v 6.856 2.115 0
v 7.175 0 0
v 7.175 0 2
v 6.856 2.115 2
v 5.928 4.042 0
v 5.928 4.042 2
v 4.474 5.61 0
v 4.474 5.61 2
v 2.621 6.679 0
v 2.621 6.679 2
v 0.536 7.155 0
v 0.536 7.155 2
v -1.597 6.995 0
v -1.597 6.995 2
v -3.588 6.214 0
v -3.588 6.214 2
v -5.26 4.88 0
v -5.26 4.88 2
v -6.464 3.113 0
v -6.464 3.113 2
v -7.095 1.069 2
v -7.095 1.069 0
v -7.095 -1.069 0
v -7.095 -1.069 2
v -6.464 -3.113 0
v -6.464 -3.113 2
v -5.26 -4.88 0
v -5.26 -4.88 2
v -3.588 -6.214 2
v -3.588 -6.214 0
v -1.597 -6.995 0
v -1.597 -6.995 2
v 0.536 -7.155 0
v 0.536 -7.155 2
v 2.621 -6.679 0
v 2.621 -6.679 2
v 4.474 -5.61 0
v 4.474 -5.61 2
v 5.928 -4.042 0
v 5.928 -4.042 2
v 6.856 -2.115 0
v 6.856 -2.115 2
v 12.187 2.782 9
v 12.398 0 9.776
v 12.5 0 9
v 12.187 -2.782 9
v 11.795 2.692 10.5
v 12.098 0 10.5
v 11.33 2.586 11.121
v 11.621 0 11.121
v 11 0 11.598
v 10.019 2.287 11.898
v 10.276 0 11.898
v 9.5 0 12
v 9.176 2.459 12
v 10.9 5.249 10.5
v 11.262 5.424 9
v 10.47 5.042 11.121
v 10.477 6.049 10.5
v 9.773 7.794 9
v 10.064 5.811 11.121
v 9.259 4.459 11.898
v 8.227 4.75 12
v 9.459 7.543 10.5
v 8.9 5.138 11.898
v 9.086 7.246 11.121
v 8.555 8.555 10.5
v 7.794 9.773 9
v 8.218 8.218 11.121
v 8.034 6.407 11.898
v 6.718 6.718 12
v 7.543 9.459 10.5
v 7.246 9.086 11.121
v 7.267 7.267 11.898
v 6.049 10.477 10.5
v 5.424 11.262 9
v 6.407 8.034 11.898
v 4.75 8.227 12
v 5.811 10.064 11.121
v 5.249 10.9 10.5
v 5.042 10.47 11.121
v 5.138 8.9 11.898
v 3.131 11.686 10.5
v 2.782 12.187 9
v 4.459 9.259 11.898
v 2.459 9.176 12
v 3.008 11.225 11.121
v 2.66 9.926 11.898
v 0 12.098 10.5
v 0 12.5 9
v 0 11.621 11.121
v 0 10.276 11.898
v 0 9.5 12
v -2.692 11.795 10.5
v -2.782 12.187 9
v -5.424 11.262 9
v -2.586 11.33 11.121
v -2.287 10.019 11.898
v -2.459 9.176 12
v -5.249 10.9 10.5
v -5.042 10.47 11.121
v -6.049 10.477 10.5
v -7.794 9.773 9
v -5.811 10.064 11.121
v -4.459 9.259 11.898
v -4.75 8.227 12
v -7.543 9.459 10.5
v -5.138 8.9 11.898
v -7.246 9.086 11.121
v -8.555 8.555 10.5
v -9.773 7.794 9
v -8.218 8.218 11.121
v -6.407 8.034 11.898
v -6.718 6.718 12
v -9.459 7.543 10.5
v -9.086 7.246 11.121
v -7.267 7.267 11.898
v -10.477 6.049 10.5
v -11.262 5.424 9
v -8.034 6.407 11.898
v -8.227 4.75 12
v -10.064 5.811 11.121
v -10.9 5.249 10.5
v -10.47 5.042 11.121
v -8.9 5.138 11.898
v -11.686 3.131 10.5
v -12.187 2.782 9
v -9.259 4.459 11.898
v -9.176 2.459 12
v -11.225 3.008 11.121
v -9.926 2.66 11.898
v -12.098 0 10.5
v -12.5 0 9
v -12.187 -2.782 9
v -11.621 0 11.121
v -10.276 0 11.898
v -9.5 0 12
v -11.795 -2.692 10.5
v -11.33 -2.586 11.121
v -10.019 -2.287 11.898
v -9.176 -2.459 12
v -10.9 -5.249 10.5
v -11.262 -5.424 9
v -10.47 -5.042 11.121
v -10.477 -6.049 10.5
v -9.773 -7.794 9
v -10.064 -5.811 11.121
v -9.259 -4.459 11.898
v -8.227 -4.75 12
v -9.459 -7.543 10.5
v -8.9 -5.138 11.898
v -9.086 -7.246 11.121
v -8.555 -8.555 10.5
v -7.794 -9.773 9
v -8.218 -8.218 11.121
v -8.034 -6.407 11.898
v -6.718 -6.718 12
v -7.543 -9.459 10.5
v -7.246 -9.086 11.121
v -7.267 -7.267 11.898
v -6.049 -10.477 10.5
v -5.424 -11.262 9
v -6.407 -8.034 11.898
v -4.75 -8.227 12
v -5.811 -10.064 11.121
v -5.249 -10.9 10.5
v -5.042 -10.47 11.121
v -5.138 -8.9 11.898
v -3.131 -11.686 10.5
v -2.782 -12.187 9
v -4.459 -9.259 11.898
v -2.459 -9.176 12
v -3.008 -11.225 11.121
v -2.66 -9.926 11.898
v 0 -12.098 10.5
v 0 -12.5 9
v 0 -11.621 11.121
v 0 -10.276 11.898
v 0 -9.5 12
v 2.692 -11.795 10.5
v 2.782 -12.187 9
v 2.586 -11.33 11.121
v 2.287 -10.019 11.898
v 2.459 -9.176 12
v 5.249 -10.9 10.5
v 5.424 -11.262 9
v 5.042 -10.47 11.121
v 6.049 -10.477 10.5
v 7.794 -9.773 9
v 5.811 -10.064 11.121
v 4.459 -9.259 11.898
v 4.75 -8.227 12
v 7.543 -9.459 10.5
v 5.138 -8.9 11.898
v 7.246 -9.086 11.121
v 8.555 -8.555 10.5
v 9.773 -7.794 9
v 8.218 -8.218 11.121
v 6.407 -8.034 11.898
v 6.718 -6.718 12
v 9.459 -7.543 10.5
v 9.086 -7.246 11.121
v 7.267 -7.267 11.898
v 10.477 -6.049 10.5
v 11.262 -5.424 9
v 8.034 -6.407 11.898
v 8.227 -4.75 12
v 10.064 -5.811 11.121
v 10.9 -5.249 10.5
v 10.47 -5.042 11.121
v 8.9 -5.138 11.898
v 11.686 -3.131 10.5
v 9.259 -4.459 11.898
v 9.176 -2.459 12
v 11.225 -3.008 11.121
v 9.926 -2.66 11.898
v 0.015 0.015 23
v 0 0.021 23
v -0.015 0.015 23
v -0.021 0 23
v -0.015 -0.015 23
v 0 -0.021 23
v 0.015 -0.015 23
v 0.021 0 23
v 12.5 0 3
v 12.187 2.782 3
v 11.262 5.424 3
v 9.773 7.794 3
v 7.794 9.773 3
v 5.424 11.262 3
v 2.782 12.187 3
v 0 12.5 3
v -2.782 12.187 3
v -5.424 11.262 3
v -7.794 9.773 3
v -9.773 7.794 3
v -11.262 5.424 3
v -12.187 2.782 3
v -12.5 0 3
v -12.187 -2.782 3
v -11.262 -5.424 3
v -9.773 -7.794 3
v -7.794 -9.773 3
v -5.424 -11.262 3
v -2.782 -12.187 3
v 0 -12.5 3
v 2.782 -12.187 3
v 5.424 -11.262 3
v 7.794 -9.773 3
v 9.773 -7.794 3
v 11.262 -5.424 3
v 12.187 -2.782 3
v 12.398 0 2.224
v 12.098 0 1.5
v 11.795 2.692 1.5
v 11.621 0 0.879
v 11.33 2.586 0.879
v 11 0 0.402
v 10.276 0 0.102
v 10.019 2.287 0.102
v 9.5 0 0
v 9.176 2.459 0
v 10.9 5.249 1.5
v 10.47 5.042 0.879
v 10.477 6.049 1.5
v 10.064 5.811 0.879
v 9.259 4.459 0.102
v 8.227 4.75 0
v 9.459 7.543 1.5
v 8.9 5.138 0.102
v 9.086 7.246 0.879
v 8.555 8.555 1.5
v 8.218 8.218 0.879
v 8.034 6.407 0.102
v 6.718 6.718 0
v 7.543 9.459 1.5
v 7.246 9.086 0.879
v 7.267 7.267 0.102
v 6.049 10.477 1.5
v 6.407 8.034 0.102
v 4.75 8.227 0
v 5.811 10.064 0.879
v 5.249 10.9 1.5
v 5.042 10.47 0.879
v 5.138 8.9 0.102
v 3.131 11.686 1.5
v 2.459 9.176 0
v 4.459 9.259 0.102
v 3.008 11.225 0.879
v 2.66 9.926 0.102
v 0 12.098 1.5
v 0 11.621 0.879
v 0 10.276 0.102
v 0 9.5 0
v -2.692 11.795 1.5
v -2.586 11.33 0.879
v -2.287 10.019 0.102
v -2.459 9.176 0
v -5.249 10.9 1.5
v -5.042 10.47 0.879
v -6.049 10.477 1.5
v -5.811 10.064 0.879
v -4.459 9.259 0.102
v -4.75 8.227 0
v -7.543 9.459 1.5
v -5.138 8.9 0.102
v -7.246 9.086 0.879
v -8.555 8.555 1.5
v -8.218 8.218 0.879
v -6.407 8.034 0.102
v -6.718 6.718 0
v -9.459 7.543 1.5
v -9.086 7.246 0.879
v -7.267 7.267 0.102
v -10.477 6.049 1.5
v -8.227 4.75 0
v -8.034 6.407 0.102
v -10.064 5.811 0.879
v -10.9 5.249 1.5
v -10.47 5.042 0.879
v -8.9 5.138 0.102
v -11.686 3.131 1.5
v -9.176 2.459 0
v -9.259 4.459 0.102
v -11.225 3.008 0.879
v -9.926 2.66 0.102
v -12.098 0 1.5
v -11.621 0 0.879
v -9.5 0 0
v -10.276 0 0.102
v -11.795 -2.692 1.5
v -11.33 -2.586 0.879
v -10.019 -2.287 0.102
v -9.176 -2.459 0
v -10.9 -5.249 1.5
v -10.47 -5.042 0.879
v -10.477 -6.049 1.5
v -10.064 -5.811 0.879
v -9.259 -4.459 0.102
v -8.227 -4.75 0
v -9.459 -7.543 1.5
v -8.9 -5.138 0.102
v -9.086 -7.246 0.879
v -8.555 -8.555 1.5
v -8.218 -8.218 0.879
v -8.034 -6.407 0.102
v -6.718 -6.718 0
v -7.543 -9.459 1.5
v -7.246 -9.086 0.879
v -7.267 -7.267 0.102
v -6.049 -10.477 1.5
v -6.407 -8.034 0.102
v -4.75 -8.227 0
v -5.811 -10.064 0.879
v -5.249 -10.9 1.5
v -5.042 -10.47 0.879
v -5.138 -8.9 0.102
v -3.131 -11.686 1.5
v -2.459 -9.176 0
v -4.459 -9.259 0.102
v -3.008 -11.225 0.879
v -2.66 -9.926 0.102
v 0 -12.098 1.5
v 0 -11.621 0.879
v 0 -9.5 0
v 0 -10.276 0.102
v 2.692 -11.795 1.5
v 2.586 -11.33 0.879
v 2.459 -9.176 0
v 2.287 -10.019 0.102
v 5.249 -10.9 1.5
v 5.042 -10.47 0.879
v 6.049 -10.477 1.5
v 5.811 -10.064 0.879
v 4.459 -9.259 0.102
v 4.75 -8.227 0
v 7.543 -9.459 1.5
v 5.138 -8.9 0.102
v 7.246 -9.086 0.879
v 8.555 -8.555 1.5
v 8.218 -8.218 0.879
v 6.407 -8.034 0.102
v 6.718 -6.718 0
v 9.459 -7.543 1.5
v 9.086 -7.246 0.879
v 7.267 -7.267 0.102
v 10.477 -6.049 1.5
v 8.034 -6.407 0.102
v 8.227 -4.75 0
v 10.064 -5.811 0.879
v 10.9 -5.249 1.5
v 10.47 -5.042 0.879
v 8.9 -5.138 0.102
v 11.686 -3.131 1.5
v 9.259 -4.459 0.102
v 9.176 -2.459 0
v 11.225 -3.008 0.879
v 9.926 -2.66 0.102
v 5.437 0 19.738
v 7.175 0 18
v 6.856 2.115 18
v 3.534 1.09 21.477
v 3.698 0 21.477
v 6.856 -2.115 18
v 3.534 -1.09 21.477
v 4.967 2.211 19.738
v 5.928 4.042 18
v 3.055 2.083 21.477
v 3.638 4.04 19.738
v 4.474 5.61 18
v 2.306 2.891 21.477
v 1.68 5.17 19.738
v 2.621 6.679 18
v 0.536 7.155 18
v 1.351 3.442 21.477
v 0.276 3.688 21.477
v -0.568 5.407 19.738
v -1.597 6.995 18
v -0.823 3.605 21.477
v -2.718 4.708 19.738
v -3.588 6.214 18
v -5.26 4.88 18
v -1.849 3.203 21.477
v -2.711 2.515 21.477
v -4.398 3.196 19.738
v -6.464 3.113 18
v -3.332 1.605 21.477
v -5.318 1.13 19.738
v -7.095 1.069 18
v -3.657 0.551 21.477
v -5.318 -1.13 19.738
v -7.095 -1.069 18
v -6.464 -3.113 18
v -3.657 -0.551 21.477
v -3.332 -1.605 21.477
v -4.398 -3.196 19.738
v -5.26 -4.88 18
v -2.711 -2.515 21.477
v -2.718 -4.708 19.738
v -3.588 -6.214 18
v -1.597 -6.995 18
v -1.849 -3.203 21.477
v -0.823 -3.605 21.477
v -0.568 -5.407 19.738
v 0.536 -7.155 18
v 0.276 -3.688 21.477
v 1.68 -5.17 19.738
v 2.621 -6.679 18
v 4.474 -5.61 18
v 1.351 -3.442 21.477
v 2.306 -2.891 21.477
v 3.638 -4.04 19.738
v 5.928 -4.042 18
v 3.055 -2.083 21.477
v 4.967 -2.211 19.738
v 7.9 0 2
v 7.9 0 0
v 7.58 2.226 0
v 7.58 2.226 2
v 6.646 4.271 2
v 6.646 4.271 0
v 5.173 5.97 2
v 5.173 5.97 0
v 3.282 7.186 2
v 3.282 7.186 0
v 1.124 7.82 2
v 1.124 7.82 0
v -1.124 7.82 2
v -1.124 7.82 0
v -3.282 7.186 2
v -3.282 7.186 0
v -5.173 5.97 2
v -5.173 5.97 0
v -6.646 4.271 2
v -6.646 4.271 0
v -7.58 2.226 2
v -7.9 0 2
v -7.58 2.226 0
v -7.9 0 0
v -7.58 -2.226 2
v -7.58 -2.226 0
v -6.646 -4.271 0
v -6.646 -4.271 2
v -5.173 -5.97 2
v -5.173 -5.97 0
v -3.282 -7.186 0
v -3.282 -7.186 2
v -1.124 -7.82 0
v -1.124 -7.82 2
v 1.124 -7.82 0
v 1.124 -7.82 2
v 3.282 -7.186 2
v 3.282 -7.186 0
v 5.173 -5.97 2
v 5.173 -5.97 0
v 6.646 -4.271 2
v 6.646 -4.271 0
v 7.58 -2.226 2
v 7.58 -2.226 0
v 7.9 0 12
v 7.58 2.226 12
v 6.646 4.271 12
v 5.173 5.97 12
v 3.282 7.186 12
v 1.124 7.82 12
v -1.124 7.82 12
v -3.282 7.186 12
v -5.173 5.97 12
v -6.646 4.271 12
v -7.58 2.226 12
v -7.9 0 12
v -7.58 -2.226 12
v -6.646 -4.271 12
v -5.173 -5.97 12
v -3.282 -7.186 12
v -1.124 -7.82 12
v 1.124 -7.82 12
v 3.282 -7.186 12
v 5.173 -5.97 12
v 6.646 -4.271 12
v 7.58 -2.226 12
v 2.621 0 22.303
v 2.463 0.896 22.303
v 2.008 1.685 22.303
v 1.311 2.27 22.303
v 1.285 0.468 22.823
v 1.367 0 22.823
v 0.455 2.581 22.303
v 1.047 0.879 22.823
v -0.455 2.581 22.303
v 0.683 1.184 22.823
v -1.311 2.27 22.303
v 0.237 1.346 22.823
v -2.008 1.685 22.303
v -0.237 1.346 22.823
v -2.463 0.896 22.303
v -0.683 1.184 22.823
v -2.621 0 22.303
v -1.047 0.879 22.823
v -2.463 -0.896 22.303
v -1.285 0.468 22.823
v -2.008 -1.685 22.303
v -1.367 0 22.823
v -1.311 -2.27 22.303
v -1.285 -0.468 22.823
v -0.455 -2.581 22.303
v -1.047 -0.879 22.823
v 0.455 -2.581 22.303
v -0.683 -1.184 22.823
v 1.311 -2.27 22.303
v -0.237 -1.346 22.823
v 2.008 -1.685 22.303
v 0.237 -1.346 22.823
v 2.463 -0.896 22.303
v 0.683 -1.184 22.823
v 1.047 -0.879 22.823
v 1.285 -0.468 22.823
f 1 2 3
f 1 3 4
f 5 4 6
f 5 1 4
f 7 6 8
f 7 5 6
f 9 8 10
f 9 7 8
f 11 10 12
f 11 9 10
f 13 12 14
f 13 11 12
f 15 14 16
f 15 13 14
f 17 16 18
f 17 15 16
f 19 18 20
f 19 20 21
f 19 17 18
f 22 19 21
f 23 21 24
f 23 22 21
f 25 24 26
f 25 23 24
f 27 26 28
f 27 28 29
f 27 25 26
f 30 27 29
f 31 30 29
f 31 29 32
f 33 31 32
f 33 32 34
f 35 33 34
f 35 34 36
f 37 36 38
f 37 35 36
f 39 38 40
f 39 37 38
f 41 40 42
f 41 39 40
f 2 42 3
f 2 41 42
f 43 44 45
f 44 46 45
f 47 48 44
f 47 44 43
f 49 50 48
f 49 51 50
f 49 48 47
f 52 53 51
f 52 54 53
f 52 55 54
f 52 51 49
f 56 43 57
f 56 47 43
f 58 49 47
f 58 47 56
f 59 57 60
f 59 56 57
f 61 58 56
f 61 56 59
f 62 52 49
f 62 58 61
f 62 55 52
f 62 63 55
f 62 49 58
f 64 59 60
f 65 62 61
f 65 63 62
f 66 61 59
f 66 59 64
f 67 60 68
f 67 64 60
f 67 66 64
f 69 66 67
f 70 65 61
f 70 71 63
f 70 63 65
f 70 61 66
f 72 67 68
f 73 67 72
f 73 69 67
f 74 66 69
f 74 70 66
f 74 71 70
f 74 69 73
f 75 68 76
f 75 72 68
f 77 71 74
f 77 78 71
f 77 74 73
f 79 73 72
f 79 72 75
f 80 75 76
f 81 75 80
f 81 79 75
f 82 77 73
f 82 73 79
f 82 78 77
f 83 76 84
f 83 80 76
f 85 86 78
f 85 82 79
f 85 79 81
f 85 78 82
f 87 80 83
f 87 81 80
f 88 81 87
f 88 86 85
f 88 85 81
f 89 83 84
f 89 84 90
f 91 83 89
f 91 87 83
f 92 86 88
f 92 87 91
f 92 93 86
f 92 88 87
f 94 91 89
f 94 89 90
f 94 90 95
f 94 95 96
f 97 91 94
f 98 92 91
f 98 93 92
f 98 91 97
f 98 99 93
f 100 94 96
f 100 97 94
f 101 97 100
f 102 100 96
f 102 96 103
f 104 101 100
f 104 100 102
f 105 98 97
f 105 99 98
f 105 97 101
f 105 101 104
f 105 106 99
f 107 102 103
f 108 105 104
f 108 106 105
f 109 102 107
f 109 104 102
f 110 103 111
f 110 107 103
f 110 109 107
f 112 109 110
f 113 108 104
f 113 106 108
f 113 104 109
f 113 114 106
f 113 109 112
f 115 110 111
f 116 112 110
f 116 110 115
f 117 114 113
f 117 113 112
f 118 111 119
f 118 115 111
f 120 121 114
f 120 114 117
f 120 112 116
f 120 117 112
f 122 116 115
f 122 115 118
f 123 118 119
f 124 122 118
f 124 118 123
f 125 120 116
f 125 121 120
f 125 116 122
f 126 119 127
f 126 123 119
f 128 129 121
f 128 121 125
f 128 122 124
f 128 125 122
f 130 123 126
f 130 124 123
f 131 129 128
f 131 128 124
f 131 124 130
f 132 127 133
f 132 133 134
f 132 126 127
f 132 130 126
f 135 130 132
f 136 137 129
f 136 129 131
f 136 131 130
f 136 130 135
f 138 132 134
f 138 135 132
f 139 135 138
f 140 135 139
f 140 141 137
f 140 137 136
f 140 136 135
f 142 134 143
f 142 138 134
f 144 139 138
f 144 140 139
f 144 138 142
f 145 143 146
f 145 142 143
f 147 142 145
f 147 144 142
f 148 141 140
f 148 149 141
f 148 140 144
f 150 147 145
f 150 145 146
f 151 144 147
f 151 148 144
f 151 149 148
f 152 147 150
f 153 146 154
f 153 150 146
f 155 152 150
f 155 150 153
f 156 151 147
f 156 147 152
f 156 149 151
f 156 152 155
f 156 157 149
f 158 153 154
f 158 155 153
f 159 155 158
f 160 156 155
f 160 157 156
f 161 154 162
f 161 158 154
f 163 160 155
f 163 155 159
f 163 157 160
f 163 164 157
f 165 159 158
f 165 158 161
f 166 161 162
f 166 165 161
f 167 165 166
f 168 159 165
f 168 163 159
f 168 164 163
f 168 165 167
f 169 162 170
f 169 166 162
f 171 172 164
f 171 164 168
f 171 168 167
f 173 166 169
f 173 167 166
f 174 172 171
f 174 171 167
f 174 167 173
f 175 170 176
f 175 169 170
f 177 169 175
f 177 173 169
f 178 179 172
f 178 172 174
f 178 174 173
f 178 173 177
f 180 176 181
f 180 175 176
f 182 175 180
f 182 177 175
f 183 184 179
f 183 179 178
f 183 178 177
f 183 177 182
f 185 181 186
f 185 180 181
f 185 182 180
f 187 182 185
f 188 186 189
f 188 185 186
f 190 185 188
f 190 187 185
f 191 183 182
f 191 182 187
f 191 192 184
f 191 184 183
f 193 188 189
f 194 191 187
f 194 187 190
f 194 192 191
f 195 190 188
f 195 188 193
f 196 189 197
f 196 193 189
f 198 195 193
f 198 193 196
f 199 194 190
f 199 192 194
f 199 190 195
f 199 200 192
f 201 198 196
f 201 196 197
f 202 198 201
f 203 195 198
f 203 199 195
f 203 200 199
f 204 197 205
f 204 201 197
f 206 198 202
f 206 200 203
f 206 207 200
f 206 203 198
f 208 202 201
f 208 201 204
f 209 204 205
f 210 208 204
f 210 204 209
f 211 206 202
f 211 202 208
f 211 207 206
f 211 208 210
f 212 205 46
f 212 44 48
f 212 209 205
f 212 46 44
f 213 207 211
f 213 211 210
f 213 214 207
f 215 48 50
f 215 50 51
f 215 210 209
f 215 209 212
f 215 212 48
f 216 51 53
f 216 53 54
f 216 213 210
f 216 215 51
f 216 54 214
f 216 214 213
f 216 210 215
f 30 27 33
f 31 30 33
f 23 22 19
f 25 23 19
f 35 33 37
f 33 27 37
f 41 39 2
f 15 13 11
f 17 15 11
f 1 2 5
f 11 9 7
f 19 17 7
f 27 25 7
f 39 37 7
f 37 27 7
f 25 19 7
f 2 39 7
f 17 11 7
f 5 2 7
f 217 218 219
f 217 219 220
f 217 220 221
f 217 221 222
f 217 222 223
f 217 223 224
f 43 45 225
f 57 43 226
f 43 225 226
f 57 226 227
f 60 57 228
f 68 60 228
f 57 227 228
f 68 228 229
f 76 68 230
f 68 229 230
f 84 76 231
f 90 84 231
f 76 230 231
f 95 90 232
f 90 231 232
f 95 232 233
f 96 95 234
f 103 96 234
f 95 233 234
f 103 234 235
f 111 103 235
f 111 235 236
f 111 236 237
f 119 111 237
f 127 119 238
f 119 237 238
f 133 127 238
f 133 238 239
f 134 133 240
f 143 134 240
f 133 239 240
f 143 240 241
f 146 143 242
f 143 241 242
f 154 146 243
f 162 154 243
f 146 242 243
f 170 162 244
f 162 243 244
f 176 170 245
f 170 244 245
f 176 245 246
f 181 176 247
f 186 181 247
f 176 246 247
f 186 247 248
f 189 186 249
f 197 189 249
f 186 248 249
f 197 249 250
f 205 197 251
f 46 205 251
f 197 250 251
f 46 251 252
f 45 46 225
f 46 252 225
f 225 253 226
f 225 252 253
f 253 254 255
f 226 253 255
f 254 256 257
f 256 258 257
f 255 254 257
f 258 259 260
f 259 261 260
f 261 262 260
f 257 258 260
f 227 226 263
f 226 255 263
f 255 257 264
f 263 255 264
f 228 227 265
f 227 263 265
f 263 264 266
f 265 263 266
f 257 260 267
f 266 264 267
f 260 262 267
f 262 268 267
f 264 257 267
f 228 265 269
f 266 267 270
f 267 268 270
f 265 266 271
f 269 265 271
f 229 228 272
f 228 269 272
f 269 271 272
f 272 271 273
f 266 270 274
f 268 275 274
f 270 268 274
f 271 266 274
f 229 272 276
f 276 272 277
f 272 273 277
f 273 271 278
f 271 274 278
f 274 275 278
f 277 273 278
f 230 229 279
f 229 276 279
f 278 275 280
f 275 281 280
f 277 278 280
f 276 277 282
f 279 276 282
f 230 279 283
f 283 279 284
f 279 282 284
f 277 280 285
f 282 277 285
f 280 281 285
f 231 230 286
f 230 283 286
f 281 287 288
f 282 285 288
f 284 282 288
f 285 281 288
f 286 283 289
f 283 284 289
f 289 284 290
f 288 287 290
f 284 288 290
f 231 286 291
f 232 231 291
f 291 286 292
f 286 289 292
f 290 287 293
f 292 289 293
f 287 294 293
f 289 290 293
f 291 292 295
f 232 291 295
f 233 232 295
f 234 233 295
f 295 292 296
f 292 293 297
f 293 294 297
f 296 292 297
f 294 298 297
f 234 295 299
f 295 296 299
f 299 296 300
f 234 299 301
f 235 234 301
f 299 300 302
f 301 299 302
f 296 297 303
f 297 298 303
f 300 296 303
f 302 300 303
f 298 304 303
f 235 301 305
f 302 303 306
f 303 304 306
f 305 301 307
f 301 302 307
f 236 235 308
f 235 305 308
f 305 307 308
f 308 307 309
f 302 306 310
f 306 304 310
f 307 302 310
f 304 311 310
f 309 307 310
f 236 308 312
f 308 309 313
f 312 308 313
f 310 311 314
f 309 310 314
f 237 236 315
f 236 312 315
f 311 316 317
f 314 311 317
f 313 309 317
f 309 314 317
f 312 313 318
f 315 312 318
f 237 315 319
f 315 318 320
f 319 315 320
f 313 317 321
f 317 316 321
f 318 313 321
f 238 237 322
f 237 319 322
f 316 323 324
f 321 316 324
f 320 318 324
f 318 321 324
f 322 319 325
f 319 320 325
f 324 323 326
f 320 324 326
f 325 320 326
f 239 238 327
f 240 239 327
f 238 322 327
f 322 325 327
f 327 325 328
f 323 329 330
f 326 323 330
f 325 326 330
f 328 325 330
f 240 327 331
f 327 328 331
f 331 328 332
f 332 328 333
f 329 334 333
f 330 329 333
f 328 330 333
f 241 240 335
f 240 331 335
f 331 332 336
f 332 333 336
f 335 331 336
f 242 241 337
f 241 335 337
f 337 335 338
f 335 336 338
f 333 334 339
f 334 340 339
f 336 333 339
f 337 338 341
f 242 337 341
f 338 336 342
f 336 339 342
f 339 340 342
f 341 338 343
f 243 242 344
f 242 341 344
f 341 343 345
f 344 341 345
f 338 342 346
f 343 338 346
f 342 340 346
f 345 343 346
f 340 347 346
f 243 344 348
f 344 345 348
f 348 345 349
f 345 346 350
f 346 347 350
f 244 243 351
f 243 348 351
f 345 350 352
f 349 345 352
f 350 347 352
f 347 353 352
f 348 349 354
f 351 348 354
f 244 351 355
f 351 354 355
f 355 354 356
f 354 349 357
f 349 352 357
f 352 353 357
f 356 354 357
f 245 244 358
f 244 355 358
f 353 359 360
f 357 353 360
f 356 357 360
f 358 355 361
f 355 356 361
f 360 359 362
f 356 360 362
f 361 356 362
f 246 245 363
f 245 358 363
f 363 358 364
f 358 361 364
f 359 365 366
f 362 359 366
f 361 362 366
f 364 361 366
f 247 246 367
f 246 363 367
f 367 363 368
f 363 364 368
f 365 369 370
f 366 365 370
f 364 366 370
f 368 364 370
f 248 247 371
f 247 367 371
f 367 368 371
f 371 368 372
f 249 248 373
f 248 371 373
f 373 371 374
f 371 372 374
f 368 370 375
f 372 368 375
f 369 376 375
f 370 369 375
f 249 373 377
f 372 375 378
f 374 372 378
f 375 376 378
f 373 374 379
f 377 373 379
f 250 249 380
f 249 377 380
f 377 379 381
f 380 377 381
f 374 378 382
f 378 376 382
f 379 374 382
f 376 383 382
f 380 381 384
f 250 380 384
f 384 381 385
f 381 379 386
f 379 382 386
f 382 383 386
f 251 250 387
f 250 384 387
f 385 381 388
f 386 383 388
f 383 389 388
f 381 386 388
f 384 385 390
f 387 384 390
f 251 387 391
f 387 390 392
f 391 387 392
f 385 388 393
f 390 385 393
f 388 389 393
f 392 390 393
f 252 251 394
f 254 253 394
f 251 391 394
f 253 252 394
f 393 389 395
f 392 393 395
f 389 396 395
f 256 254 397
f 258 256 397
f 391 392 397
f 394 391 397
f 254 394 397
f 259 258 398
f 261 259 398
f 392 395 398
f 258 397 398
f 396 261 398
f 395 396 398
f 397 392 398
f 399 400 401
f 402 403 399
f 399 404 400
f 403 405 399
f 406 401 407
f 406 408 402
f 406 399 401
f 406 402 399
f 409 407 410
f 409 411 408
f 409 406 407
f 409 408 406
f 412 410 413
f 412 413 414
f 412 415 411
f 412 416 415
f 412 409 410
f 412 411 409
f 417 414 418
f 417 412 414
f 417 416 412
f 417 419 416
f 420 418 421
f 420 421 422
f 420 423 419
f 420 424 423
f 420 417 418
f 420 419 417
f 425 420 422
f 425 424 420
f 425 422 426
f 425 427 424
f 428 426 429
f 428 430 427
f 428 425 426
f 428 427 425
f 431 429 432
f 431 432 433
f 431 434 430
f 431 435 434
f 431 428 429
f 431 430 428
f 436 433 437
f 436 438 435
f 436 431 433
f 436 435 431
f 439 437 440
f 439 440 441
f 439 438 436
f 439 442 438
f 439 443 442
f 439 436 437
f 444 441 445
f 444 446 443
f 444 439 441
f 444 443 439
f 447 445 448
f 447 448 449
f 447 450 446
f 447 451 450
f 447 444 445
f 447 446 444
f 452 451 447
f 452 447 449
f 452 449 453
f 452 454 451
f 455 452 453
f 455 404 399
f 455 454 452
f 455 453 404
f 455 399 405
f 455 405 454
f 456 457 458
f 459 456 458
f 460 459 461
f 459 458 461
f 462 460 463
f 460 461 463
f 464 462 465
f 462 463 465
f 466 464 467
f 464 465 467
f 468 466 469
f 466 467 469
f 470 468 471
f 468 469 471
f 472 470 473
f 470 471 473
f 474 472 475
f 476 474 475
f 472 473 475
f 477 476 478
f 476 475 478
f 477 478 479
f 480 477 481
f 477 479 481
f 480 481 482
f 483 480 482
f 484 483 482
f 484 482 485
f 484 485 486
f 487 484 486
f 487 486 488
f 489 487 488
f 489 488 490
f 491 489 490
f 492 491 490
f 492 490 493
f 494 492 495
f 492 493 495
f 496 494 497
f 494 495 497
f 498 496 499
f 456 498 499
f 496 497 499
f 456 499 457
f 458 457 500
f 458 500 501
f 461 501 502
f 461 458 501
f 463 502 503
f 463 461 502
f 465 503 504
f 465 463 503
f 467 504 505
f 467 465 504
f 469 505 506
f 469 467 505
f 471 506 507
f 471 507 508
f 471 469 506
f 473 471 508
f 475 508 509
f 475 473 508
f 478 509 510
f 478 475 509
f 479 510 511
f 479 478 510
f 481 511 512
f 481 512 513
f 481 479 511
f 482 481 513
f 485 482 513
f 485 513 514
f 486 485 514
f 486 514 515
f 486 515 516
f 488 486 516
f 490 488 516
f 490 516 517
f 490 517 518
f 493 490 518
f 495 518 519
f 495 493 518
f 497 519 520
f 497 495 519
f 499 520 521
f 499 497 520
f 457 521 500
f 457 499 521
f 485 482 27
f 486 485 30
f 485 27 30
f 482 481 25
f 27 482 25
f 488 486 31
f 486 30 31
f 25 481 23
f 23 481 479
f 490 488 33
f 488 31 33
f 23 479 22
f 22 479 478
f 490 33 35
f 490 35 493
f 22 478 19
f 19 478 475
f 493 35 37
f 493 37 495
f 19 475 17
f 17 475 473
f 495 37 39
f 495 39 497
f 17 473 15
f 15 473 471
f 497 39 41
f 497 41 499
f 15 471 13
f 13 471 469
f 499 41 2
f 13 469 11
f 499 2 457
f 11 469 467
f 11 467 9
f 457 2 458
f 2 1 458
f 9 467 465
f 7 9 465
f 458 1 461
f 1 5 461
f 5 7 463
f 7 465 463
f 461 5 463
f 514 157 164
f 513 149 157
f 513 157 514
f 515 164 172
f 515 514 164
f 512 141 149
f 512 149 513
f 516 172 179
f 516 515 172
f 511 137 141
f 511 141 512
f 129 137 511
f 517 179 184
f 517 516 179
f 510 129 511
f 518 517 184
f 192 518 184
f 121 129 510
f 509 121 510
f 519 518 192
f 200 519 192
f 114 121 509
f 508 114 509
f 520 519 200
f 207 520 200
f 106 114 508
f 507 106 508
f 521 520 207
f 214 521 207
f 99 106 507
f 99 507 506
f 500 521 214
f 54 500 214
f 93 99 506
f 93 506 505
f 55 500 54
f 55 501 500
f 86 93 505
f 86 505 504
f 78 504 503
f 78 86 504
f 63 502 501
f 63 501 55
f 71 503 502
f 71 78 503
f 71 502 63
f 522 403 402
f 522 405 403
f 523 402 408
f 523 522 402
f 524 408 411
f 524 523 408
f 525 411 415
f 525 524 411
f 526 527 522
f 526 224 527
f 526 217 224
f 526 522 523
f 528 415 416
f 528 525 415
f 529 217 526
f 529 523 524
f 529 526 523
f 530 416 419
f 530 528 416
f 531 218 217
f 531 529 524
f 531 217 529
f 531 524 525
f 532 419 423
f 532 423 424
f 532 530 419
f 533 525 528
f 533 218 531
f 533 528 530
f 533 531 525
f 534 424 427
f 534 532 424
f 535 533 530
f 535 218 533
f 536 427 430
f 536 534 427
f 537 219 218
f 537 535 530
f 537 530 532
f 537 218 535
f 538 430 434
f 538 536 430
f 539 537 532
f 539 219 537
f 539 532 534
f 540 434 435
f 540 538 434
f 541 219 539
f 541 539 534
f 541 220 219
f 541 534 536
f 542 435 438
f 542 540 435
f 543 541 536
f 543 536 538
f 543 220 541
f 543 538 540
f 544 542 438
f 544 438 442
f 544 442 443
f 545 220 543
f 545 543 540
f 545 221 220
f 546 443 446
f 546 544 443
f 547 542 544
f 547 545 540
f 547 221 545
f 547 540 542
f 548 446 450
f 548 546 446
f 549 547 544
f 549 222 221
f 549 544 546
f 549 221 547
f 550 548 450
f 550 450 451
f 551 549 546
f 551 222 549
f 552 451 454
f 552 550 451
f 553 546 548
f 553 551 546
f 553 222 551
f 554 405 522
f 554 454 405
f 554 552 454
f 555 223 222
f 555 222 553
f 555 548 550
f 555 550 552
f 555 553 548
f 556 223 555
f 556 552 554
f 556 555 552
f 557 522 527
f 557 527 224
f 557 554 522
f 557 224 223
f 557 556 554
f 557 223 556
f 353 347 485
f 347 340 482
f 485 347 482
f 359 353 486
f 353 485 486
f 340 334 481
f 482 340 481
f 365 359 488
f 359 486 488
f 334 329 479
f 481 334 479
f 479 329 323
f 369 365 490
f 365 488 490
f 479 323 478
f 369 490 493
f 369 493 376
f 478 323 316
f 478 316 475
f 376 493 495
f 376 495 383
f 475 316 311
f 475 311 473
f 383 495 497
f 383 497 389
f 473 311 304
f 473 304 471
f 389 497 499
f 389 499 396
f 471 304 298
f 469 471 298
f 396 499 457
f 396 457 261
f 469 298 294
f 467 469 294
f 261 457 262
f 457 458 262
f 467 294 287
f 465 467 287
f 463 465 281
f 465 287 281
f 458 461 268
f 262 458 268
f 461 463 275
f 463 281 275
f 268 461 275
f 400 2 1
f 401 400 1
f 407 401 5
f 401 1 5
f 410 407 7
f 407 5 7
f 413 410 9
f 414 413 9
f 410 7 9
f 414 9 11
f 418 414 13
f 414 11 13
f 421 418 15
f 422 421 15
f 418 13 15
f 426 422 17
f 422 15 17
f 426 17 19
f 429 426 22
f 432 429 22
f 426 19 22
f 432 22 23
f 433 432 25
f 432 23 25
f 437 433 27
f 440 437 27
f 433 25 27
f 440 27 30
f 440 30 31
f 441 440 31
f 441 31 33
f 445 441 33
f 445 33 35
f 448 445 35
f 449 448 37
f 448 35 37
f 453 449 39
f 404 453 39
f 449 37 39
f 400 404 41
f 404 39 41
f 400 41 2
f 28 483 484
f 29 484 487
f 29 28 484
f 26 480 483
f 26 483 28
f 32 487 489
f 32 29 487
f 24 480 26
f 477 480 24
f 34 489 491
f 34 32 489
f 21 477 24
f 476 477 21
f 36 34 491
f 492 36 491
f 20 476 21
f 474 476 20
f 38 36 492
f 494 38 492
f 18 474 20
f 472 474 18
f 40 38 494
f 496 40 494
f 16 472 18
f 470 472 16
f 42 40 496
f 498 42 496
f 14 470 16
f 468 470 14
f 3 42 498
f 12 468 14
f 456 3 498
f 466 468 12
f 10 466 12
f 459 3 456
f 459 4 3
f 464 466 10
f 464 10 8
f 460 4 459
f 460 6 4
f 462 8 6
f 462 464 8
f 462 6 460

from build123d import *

# Parameters (mm, degrees)
F0_R     = 12.5
F0_R_2   = 7.9
F1_DEPTH = 12
F0_R_3   = 7.175
F2_DEPTH = 23
F3_DEPTH = 2
F4_R     = 3
F5_SIZE  = 5
F6_R     = 5.2


with BuildPart() as f1:
    # F0 (on Top) → F1 (new body)
    with BuildSketch(Plane.XY):
        Circle(F0_R)
        Circle(F0_R_2, mode=Mode.SUBTRACT)
    extrude(amount=F1_DEPTH)

    # F4
    f4_edges = [f1.edges().sort_by_distance(p)[0] for p in [
        (-12.5, 0, 12),
        (-12.5, 0, 0),
    ]]
    fillet(f4_edges, radius=F4_R)


with BuildPart() as f2:
    # F0 (on Top) → F2 (new body)
    with BuildSketch(Plane.XY):
        Circle(F0_R_3)
    extrude(amount=F2_DEPTH)

    # F5
    f5_edges = [f2.edges().sort_by_distance(p)[0] for p in [
        (-7.175, 0, 23),
    ]]
    chamfer(f5_edges, length=F5_SIZE)

    # F6
    f6_edges = [f2.edges().sort_by_distance(p)[0] for p in [
        (-2.175, 0, 23),
    ]]
    fillet(f6_edges, radius=F6_R)


with BuildPart() as f3:
    # F0 (on Top) → F3 (new body)
    with BuildSketch(Plane.XY):
        Circle(F0_R_2)
        Circle(F0_R_3, mode=Mode.SUBTRACT)
    extrude(amount=F3_DEPTH)


solid = Compound([f1.part, f2.part, f3.part])
